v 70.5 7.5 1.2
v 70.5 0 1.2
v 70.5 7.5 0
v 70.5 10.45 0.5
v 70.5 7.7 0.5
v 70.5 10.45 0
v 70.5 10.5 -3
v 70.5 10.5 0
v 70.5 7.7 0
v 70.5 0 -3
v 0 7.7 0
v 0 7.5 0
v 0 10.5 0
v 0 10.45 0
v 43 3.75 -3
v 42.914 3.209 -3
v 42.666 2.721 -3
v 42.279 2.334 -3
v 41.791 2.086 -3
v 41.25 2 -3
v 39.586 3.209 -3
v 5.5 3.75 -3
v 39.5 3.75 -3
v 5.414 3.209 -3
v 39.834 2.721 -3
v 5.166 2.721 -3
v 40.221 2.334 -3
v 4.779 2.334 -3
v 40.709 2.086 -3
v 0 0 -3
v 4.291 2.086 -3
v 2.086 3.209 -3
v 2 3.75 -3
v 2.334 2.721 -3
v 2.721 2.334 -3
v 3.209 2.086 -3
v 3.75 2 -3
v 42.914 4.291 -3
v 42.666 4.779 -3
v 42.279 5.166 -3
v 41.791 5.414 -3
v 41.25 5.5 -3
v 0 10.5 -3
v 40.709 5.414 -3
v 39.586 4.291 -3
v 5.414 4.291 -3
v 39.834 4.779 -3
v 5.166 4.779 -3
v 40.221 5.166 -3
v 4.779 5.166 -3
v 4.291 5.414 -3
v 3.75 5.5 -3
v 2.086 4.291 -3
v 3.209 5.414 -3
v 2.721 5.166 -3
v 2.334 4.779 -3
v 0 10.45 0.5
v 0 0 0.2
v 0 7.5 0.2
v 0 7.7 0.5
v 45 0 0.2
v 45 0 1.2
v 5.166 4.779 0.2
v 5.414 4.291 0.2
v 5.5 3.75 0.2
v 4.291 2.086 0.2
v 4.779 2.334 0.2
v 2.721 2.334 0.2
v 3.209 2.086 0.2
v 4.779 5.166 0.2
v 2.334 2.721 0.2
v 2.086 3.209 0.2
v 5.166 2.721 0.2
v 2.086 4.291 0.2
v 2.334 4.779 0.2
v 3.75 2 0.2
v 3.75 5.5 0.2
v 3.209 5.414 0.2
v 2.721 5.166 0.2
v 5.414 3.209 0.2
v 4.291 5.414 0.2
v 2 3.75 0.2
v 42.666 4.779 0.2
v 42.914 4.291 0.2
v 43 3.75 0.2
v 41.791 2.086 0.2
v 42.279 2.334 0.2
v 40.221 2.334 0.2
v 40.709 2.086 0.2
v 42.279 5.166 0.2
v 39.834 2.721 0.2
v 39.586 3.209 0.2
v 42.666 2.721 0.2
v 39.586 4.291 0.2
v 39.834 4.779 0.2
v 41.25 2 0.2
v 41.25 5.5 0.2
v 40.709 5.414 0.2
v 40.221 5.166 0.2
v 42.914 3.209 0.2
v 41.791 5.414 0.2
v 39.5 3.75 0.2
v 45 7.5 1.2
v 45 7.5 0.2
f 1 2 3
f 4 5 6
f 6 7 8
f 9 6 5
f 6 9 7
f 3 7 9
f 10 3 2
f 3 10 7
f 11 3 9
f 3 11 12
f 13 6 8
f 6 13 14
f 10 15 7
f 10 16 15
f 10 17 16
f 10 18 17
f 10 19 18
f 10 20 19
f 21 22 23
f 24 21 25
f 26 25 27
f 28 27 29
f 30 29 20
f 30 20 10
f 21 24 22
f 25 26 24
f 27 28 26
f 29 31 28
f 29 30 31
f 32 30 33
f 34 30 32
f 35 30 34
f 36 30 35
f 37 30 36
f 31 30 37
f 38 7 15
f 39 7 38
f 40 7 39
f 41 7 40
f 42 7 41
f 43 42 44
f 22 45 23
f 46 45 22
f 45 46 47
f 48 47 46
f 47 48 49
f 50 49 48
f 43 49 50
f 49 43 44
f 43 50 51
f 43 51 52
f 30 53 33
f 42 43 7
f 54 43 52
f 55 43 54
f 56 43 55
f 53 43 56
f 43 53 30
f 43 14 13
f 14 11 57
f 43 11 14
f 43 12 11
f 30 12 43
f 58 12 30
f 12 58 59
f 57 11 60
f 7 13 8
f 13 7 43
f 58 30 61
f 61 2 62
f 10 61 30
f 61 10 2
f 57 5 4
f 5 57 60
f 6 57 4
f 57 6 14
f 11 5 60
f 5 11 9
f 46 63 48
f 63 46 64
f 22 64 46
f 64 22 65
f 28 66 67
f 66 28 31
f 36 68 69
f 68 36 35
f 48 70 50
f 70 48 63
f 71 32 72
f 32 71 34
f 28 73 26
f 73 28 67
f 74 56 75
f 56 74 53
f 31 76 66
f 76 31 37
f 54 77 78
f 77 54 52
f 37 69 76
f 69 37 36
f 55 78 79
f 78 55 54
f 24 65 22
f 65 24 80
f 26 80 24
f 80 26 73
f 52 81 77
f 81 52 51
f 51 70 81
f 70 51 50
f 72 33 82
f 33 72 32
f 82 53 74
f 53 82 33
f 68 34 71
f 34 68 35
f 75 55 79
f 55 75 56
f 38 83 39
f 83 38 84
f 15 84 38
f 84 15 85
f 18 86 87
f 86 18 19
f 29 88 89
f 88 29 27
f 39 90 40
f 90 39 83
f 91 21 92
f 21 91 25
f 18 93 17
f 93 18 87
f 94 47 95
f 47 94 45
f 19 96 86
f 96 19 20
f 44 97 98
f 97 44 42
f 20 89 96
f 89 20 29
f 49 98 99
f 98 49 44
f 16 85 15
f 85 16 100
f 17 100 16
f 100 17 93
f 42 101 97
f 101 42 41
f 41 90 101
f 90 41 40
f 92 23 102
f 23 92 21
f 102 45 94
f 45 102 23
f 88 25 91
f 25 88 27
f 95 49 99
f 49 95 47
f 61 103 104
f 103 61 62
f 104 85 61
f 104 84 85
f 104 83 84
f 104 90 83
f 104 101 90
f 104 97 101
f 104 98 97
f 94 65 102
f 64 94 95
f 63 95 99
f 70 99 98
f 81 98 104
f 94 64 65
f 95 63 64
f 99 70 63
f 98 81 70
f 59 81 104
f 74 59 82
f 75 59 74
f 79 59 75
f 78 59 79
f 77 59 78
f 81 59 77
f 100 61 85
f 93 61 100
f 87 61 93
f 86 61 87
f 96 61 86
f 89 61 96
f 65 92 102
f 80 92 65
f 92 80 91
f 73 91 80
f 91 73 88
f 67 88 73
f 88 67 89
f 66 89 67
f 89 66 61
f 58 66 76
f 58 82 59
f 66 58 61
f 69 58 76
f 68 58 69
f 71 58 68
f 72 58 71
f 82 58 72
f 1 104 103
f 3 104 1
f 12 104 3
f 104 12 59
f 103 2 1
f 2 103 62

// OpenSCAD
include<rack_renamed.scad>


//include <holder_half.scad>

sled_cap();


/*translate([27,20,30+1])rotate([0,180,0])
difference(){
import("pinion.stl");
translate([7,0,-5])cylinder(r=3.2/2,h=30,$fn=30);
translate([-7,0,-5])cylinder(r=3.2/2,h=30,$fn=30);
}
*/

/*
include <sled_bottom.scad>
include <holder_half.scad>
include <rack_renamed.scad>
include <holder_half.scad>
*/
//translate([50,0,0]){include <sled_cap.scad>}

//holder_half_mod_toolchanger_combo();
//servo_linear_assy();
//servo_linear_assy();

/*
difference(){
import("sled_bottom.stl");
#translate([50,-20,0])cube([25,20,20]);
}
*/
//include <sled_bottom.scad>

module holder_half_mod(){
difference(){
union(){
import("/Users/richard/Documents/dr.robot/dr.robotlab_library/MG995_Servo_Linear_Actuator/files/holder_half.stl");
//color("pink")translate([-66.8-7.8,13.5,44])cube([6+1.5,30,10]);
//color("pink")translate([-66.8-7.8,13.5,44+10-2])cube([6+1.5,40,12]);
}

translate([-30-70+25,2-5,71])rotate([0,90,0]){
translate([7-4,35,-2])cylinder(r=3.8/2,h=200,$fn=30);
translate([7-4,35,-0])cylinder(r=8/2,h=3,$fn=30);
translate([7+7,41+11.25,-2])cylinder(r=3.8/2,h=200,$fn=30);
translate([7+7,41+11.25,-0])cylinder(r=8/2,h=3,$fn=30);
translate([7+18,35,-2])cylinder(r=3.8/2,h=200,$fn=30);
translate([7+18,35,-0])cylinder(r=8/2,h=3,$fn=30);
}
}
}


module holder_half_toolchanger(){
difference(){
union(){
import("/Users/richard/Documents/dr.robot/dr.robotlab_library/MG995_Servo_Linear_Actuator/files/holder_half.stl");
//color("pink")translate([-66.8-7.8,13.5,44])cube([6+1.5,30,10]);
//color("pink")translate([-66.8-7.8,13.5,44+10-2])cube([6+1.5,40,12]);
}

translate([-30-70+25,2-5,71])rotate([0,90,0]){
translate([7-4,35,-2])cylinder(r=3.8/2,h=200,$fn=30);
translate([7-4,35,-0])cylinder(r=8/2,h=3,$fn=30);
translate([7+7,41+11.25,-2])cylinder(r=3.8/2,h=200,$fn=30);
translate([7+7,41+11.25,-0])cylinder(r=8/2,h=3,$fn=30);
translate([7+18,35,-2])cylinder(r=3.8/2,h=200,$fn=30);
translate([7+18,35,-0])cylinder(r=8/2,h=3,$fn=30);
}
}
}


module holder_half_mod_toolchanger(){
difference(){
union(){
import("/Users/richard/Documents/dr.robot/dr.robotlab_library/MG995_Servo_Linear_Actuator/files/holder_half.stl");
//color("pink")translate([-66.8-7.8,13.5,44])cube([6+1.5,30,10]);
//color("pink")translate([-66.8-7.8,13.5,44+10-2])cube([6+1.5,40,12]);
}

translate([-30-70+25,2-5,71])rotate([0,90,0]){
translate([7-4,35,-2])cylinder(r=3.8/2,h=200,$fn=30);
translate([7-4,35,-0])cylinder(r=8/2,h=3,$fn=30);
translate([7+7,41+11.25,-2])cylinder(r=3.8/2,h=200,$fn=30);
translate([7+7,41+11.25,-0])cylinder(r=8/2,h=3,$fn=30);
translate([7+18,35,-2])cylinder(r=3.8/2,h=200,$fn=30);
translate([7+18,35,-0])cylinder(r=8/2,h=3,$fn=30);
}
}
}






module sled_cap(){

translate([45,0,0]) cube(size = [25.5,7.5,1.2]);

difference() {
    union(){
    translate([0,0,-3]) cube(size = [70.5,10.5,3]);
    //translate([0,0+7.7,-3]) cube(size = [70.5,2.75,3.2]);
    translate([0,0+7.7,-3]) cube(size = [70.5,2.75,3.5]);
    }
    translate([3.75,3.75,-8]) cylinder(h = 20, r = 1.75, $fn=20);
    translate([41.25,3.75,-8]) cylinder(h = 20, r = 1.75, $fn=20);
}

difference() {
    cube(size = [45,7.5,0.2]);
    translate([3.75,3.75,-8]) cylinder(h = 20, r = 1.75, $fn=20);
    translate([41.25,3.75,-8]) cylinder(h = 20, r = 1.75, $fn=20);
}

}

module holder_half_mod_toolchanger_combo(){

difference(){
union(){
translate([34.5,109.5,63])rotate([0,180,-90])holder_half_mod_toolchanger();
//translate([34.5-14,109.5-149,63])rotate([0,180,90])holder_half_mod_toolchanger();
}
//.translate([34.5-14,109.5-149,63])rotate([0,180,90])
//translate([41,-10+20-20,-20])cube([50,200,80]);
#translate([41.5,-10+30,-20])cube([50,35,80]);
translate([41-77,-10+20-20,-20])cube([50,200,80]);
#translate([41-77+60-1.5,-10+20-20+14+6.5,-20])cylinder(r=3.5/2,h=200,$fn=300);
#translate([41-77+60+8+0.5,-10+20-20+14+6.5,-20])cylinder(r=3.5/2,h=200,$fn=300);
/*
translate([41-77+60+8,-10+20-20+14,0+3])cylinder(r=8/2,h=200,$fn=300);
translate([41-77+60-1,-10+20-20+14,0+3])cylinder(r=8/2,h=200,$fn=300);
translate([41-77+60+8,-10+20-20+14+62,0+3])cylinder(r=8/2,h=200,$fn=300);
translate([41-77+60-1,-10+20-20+14+62,0+3])cylinder(r=8/2,h=200,$fn=300);
*/
translate([41-77+60-1-.5,-10+20-20+14+62-6.5,-20])cylinder(r=3.5/2,h=200,$fn=300);
translate([41-77+60+8.5,-10+20-20+14+62-6.5,-20])cylinder(r=3.5/2,h=200,$fn=300);
}
}


module servo_linear_assy(){
//translate([54,100-30+0.5,0])rotate([0,0,0])import("/Users/richard/Documents/dr.robot/dr.robotlab_library/MG995_Servo_Linear_Actuator/files/holder_half.stl");
//translate([34.5,109.5,63])rotate([0,180,-90])import("/Users/richard/Documents/dr.robot/dr.robotlab_library/MG995_Servo_Linear_Actuator/files/holder_half.stl");

//translate([34.5,109.5,63])rotate([0,180,-90])holder_half_mod();
//translate([70-8.5,70.7,34.5])rotate([0,180,90])sled_cap();
translate([70-8.5-68,70.7,34.5])rotate([0,180,90])mirror([0,1,0])sled_cap();

//translate([34.5-14,109.5-149,63])rotate([0,180,90])import("holder_half.stl");
//translate([34.5-14,109.5-149,63])rotate([0,180,90])holder_half_mod();
holder_half_mod_toolchanger_combo();
/*
difference(){
translate([54,100-30+0.5,0])rotate([0,0,180])import("/Users/richard/Documents/dr.robot/dr.robotlab_library/MG995_Servo_Linear_Actuator/files/holder_half.stl");
translate([36,100-30+0.5+50,0+11])rotate([90,0,0])cylinder(r=2.8/2,h=120,$fn=30);
translate([36-18,100-30+0.5+50,0+11])rotate([90,0,0])cylinder(r=2.8/2,h=120,$fn=30);
}
*/
//translate([54-54,-0,0])rotate([0,0,0])import("/Users/richard/Documents/dr.robot/dr.robotlab_library/MG995_Servo_Linear_Actuator/files/holder_half.stl");

//translate([50+4,-50+120+0.5,27.5])color("lime")rotate([0,180,90])import("sled_bottom_no_limit_switch_protrusion.stl");

translate([50+4-53.5,-50+120+0,27.5])color("lime")rotate([0,180,90])mirror([0,1,0])import("sled_bottom_no_limit_switch_protrusion.stl");


//translate([10-1,-10-15+20,30])rotate([0,0,90])color("pink")import("/Users/richard/Documents/dr.robot/dr.robotlab_library/MG995_Servo_Linear_Actuator/files/rack.stl");
//translate([10-1,-10-15+20,30])rotate([0,0,90])color("")rack();

//translate([10-1+37,-10-15+20,30])rotate([0,0,90])mirror([0,1,0])color("pink")import("/Users/richard/Documents/dr.robot/dr.robotlab_library/MG995_Servo_Linear_Actuator/files/rack.stl");
translate([10-1+37,-10-15+20-3,30])rotate([0,0,90])mirror([0,1,0])color("")rack();
translate([0,4,-0])rotate([0,0,0])

translate([1,0,0]){difference(){
//color("peru")import("pinion.stl");
}
translate([37-1,14-0-4,-13])rotate([0,0,90])servo();
}

}

module servo(){
 bcl = 0.4;
 color([bcl,bcl,bcl])
 cube([40.75,19.85,35]);
 difference(){
 color([bcl,bcl,bcl])translate([-(55.5-40.74)/2,0,35-8])cube([55.5,19.85,2.5]);
 translate([-(55.5-40.74)/2+3.8,0+4.5,35-8-10])cylinder(r=3.7/2,h=20);
 translate([-(55.5-40.74)/2+3.8,0+4.5+10,35-8-10])cylinder(r=3.7/2,h=20);
 translate([-(55.5-40.74)/2+3.8+49,0+4.5,35-8-10])cylinder(r=3.7/2,h=20);
 translate([-(55.5-40.74)/2+3.8+49,0+4.5+10,35-8-10])cylinder(r=3.7/2,h=20);
 }
/*
*/ 
 cl = 0.9;
 color([cl,cl,cl]){
 translate([10,10,30])cylinder(r=8/2,h=14);
 translate([10,10,41-6+8])difference(){
  cylinder(r=21/2,h=2);
  translate([0,7,-4])cylinder(r=2.6/2,h=20,$fn=30);
  translate([0,-7,-4])cylinder(r=2.6/2,h=20,$fn=30);
 }
 }
}
